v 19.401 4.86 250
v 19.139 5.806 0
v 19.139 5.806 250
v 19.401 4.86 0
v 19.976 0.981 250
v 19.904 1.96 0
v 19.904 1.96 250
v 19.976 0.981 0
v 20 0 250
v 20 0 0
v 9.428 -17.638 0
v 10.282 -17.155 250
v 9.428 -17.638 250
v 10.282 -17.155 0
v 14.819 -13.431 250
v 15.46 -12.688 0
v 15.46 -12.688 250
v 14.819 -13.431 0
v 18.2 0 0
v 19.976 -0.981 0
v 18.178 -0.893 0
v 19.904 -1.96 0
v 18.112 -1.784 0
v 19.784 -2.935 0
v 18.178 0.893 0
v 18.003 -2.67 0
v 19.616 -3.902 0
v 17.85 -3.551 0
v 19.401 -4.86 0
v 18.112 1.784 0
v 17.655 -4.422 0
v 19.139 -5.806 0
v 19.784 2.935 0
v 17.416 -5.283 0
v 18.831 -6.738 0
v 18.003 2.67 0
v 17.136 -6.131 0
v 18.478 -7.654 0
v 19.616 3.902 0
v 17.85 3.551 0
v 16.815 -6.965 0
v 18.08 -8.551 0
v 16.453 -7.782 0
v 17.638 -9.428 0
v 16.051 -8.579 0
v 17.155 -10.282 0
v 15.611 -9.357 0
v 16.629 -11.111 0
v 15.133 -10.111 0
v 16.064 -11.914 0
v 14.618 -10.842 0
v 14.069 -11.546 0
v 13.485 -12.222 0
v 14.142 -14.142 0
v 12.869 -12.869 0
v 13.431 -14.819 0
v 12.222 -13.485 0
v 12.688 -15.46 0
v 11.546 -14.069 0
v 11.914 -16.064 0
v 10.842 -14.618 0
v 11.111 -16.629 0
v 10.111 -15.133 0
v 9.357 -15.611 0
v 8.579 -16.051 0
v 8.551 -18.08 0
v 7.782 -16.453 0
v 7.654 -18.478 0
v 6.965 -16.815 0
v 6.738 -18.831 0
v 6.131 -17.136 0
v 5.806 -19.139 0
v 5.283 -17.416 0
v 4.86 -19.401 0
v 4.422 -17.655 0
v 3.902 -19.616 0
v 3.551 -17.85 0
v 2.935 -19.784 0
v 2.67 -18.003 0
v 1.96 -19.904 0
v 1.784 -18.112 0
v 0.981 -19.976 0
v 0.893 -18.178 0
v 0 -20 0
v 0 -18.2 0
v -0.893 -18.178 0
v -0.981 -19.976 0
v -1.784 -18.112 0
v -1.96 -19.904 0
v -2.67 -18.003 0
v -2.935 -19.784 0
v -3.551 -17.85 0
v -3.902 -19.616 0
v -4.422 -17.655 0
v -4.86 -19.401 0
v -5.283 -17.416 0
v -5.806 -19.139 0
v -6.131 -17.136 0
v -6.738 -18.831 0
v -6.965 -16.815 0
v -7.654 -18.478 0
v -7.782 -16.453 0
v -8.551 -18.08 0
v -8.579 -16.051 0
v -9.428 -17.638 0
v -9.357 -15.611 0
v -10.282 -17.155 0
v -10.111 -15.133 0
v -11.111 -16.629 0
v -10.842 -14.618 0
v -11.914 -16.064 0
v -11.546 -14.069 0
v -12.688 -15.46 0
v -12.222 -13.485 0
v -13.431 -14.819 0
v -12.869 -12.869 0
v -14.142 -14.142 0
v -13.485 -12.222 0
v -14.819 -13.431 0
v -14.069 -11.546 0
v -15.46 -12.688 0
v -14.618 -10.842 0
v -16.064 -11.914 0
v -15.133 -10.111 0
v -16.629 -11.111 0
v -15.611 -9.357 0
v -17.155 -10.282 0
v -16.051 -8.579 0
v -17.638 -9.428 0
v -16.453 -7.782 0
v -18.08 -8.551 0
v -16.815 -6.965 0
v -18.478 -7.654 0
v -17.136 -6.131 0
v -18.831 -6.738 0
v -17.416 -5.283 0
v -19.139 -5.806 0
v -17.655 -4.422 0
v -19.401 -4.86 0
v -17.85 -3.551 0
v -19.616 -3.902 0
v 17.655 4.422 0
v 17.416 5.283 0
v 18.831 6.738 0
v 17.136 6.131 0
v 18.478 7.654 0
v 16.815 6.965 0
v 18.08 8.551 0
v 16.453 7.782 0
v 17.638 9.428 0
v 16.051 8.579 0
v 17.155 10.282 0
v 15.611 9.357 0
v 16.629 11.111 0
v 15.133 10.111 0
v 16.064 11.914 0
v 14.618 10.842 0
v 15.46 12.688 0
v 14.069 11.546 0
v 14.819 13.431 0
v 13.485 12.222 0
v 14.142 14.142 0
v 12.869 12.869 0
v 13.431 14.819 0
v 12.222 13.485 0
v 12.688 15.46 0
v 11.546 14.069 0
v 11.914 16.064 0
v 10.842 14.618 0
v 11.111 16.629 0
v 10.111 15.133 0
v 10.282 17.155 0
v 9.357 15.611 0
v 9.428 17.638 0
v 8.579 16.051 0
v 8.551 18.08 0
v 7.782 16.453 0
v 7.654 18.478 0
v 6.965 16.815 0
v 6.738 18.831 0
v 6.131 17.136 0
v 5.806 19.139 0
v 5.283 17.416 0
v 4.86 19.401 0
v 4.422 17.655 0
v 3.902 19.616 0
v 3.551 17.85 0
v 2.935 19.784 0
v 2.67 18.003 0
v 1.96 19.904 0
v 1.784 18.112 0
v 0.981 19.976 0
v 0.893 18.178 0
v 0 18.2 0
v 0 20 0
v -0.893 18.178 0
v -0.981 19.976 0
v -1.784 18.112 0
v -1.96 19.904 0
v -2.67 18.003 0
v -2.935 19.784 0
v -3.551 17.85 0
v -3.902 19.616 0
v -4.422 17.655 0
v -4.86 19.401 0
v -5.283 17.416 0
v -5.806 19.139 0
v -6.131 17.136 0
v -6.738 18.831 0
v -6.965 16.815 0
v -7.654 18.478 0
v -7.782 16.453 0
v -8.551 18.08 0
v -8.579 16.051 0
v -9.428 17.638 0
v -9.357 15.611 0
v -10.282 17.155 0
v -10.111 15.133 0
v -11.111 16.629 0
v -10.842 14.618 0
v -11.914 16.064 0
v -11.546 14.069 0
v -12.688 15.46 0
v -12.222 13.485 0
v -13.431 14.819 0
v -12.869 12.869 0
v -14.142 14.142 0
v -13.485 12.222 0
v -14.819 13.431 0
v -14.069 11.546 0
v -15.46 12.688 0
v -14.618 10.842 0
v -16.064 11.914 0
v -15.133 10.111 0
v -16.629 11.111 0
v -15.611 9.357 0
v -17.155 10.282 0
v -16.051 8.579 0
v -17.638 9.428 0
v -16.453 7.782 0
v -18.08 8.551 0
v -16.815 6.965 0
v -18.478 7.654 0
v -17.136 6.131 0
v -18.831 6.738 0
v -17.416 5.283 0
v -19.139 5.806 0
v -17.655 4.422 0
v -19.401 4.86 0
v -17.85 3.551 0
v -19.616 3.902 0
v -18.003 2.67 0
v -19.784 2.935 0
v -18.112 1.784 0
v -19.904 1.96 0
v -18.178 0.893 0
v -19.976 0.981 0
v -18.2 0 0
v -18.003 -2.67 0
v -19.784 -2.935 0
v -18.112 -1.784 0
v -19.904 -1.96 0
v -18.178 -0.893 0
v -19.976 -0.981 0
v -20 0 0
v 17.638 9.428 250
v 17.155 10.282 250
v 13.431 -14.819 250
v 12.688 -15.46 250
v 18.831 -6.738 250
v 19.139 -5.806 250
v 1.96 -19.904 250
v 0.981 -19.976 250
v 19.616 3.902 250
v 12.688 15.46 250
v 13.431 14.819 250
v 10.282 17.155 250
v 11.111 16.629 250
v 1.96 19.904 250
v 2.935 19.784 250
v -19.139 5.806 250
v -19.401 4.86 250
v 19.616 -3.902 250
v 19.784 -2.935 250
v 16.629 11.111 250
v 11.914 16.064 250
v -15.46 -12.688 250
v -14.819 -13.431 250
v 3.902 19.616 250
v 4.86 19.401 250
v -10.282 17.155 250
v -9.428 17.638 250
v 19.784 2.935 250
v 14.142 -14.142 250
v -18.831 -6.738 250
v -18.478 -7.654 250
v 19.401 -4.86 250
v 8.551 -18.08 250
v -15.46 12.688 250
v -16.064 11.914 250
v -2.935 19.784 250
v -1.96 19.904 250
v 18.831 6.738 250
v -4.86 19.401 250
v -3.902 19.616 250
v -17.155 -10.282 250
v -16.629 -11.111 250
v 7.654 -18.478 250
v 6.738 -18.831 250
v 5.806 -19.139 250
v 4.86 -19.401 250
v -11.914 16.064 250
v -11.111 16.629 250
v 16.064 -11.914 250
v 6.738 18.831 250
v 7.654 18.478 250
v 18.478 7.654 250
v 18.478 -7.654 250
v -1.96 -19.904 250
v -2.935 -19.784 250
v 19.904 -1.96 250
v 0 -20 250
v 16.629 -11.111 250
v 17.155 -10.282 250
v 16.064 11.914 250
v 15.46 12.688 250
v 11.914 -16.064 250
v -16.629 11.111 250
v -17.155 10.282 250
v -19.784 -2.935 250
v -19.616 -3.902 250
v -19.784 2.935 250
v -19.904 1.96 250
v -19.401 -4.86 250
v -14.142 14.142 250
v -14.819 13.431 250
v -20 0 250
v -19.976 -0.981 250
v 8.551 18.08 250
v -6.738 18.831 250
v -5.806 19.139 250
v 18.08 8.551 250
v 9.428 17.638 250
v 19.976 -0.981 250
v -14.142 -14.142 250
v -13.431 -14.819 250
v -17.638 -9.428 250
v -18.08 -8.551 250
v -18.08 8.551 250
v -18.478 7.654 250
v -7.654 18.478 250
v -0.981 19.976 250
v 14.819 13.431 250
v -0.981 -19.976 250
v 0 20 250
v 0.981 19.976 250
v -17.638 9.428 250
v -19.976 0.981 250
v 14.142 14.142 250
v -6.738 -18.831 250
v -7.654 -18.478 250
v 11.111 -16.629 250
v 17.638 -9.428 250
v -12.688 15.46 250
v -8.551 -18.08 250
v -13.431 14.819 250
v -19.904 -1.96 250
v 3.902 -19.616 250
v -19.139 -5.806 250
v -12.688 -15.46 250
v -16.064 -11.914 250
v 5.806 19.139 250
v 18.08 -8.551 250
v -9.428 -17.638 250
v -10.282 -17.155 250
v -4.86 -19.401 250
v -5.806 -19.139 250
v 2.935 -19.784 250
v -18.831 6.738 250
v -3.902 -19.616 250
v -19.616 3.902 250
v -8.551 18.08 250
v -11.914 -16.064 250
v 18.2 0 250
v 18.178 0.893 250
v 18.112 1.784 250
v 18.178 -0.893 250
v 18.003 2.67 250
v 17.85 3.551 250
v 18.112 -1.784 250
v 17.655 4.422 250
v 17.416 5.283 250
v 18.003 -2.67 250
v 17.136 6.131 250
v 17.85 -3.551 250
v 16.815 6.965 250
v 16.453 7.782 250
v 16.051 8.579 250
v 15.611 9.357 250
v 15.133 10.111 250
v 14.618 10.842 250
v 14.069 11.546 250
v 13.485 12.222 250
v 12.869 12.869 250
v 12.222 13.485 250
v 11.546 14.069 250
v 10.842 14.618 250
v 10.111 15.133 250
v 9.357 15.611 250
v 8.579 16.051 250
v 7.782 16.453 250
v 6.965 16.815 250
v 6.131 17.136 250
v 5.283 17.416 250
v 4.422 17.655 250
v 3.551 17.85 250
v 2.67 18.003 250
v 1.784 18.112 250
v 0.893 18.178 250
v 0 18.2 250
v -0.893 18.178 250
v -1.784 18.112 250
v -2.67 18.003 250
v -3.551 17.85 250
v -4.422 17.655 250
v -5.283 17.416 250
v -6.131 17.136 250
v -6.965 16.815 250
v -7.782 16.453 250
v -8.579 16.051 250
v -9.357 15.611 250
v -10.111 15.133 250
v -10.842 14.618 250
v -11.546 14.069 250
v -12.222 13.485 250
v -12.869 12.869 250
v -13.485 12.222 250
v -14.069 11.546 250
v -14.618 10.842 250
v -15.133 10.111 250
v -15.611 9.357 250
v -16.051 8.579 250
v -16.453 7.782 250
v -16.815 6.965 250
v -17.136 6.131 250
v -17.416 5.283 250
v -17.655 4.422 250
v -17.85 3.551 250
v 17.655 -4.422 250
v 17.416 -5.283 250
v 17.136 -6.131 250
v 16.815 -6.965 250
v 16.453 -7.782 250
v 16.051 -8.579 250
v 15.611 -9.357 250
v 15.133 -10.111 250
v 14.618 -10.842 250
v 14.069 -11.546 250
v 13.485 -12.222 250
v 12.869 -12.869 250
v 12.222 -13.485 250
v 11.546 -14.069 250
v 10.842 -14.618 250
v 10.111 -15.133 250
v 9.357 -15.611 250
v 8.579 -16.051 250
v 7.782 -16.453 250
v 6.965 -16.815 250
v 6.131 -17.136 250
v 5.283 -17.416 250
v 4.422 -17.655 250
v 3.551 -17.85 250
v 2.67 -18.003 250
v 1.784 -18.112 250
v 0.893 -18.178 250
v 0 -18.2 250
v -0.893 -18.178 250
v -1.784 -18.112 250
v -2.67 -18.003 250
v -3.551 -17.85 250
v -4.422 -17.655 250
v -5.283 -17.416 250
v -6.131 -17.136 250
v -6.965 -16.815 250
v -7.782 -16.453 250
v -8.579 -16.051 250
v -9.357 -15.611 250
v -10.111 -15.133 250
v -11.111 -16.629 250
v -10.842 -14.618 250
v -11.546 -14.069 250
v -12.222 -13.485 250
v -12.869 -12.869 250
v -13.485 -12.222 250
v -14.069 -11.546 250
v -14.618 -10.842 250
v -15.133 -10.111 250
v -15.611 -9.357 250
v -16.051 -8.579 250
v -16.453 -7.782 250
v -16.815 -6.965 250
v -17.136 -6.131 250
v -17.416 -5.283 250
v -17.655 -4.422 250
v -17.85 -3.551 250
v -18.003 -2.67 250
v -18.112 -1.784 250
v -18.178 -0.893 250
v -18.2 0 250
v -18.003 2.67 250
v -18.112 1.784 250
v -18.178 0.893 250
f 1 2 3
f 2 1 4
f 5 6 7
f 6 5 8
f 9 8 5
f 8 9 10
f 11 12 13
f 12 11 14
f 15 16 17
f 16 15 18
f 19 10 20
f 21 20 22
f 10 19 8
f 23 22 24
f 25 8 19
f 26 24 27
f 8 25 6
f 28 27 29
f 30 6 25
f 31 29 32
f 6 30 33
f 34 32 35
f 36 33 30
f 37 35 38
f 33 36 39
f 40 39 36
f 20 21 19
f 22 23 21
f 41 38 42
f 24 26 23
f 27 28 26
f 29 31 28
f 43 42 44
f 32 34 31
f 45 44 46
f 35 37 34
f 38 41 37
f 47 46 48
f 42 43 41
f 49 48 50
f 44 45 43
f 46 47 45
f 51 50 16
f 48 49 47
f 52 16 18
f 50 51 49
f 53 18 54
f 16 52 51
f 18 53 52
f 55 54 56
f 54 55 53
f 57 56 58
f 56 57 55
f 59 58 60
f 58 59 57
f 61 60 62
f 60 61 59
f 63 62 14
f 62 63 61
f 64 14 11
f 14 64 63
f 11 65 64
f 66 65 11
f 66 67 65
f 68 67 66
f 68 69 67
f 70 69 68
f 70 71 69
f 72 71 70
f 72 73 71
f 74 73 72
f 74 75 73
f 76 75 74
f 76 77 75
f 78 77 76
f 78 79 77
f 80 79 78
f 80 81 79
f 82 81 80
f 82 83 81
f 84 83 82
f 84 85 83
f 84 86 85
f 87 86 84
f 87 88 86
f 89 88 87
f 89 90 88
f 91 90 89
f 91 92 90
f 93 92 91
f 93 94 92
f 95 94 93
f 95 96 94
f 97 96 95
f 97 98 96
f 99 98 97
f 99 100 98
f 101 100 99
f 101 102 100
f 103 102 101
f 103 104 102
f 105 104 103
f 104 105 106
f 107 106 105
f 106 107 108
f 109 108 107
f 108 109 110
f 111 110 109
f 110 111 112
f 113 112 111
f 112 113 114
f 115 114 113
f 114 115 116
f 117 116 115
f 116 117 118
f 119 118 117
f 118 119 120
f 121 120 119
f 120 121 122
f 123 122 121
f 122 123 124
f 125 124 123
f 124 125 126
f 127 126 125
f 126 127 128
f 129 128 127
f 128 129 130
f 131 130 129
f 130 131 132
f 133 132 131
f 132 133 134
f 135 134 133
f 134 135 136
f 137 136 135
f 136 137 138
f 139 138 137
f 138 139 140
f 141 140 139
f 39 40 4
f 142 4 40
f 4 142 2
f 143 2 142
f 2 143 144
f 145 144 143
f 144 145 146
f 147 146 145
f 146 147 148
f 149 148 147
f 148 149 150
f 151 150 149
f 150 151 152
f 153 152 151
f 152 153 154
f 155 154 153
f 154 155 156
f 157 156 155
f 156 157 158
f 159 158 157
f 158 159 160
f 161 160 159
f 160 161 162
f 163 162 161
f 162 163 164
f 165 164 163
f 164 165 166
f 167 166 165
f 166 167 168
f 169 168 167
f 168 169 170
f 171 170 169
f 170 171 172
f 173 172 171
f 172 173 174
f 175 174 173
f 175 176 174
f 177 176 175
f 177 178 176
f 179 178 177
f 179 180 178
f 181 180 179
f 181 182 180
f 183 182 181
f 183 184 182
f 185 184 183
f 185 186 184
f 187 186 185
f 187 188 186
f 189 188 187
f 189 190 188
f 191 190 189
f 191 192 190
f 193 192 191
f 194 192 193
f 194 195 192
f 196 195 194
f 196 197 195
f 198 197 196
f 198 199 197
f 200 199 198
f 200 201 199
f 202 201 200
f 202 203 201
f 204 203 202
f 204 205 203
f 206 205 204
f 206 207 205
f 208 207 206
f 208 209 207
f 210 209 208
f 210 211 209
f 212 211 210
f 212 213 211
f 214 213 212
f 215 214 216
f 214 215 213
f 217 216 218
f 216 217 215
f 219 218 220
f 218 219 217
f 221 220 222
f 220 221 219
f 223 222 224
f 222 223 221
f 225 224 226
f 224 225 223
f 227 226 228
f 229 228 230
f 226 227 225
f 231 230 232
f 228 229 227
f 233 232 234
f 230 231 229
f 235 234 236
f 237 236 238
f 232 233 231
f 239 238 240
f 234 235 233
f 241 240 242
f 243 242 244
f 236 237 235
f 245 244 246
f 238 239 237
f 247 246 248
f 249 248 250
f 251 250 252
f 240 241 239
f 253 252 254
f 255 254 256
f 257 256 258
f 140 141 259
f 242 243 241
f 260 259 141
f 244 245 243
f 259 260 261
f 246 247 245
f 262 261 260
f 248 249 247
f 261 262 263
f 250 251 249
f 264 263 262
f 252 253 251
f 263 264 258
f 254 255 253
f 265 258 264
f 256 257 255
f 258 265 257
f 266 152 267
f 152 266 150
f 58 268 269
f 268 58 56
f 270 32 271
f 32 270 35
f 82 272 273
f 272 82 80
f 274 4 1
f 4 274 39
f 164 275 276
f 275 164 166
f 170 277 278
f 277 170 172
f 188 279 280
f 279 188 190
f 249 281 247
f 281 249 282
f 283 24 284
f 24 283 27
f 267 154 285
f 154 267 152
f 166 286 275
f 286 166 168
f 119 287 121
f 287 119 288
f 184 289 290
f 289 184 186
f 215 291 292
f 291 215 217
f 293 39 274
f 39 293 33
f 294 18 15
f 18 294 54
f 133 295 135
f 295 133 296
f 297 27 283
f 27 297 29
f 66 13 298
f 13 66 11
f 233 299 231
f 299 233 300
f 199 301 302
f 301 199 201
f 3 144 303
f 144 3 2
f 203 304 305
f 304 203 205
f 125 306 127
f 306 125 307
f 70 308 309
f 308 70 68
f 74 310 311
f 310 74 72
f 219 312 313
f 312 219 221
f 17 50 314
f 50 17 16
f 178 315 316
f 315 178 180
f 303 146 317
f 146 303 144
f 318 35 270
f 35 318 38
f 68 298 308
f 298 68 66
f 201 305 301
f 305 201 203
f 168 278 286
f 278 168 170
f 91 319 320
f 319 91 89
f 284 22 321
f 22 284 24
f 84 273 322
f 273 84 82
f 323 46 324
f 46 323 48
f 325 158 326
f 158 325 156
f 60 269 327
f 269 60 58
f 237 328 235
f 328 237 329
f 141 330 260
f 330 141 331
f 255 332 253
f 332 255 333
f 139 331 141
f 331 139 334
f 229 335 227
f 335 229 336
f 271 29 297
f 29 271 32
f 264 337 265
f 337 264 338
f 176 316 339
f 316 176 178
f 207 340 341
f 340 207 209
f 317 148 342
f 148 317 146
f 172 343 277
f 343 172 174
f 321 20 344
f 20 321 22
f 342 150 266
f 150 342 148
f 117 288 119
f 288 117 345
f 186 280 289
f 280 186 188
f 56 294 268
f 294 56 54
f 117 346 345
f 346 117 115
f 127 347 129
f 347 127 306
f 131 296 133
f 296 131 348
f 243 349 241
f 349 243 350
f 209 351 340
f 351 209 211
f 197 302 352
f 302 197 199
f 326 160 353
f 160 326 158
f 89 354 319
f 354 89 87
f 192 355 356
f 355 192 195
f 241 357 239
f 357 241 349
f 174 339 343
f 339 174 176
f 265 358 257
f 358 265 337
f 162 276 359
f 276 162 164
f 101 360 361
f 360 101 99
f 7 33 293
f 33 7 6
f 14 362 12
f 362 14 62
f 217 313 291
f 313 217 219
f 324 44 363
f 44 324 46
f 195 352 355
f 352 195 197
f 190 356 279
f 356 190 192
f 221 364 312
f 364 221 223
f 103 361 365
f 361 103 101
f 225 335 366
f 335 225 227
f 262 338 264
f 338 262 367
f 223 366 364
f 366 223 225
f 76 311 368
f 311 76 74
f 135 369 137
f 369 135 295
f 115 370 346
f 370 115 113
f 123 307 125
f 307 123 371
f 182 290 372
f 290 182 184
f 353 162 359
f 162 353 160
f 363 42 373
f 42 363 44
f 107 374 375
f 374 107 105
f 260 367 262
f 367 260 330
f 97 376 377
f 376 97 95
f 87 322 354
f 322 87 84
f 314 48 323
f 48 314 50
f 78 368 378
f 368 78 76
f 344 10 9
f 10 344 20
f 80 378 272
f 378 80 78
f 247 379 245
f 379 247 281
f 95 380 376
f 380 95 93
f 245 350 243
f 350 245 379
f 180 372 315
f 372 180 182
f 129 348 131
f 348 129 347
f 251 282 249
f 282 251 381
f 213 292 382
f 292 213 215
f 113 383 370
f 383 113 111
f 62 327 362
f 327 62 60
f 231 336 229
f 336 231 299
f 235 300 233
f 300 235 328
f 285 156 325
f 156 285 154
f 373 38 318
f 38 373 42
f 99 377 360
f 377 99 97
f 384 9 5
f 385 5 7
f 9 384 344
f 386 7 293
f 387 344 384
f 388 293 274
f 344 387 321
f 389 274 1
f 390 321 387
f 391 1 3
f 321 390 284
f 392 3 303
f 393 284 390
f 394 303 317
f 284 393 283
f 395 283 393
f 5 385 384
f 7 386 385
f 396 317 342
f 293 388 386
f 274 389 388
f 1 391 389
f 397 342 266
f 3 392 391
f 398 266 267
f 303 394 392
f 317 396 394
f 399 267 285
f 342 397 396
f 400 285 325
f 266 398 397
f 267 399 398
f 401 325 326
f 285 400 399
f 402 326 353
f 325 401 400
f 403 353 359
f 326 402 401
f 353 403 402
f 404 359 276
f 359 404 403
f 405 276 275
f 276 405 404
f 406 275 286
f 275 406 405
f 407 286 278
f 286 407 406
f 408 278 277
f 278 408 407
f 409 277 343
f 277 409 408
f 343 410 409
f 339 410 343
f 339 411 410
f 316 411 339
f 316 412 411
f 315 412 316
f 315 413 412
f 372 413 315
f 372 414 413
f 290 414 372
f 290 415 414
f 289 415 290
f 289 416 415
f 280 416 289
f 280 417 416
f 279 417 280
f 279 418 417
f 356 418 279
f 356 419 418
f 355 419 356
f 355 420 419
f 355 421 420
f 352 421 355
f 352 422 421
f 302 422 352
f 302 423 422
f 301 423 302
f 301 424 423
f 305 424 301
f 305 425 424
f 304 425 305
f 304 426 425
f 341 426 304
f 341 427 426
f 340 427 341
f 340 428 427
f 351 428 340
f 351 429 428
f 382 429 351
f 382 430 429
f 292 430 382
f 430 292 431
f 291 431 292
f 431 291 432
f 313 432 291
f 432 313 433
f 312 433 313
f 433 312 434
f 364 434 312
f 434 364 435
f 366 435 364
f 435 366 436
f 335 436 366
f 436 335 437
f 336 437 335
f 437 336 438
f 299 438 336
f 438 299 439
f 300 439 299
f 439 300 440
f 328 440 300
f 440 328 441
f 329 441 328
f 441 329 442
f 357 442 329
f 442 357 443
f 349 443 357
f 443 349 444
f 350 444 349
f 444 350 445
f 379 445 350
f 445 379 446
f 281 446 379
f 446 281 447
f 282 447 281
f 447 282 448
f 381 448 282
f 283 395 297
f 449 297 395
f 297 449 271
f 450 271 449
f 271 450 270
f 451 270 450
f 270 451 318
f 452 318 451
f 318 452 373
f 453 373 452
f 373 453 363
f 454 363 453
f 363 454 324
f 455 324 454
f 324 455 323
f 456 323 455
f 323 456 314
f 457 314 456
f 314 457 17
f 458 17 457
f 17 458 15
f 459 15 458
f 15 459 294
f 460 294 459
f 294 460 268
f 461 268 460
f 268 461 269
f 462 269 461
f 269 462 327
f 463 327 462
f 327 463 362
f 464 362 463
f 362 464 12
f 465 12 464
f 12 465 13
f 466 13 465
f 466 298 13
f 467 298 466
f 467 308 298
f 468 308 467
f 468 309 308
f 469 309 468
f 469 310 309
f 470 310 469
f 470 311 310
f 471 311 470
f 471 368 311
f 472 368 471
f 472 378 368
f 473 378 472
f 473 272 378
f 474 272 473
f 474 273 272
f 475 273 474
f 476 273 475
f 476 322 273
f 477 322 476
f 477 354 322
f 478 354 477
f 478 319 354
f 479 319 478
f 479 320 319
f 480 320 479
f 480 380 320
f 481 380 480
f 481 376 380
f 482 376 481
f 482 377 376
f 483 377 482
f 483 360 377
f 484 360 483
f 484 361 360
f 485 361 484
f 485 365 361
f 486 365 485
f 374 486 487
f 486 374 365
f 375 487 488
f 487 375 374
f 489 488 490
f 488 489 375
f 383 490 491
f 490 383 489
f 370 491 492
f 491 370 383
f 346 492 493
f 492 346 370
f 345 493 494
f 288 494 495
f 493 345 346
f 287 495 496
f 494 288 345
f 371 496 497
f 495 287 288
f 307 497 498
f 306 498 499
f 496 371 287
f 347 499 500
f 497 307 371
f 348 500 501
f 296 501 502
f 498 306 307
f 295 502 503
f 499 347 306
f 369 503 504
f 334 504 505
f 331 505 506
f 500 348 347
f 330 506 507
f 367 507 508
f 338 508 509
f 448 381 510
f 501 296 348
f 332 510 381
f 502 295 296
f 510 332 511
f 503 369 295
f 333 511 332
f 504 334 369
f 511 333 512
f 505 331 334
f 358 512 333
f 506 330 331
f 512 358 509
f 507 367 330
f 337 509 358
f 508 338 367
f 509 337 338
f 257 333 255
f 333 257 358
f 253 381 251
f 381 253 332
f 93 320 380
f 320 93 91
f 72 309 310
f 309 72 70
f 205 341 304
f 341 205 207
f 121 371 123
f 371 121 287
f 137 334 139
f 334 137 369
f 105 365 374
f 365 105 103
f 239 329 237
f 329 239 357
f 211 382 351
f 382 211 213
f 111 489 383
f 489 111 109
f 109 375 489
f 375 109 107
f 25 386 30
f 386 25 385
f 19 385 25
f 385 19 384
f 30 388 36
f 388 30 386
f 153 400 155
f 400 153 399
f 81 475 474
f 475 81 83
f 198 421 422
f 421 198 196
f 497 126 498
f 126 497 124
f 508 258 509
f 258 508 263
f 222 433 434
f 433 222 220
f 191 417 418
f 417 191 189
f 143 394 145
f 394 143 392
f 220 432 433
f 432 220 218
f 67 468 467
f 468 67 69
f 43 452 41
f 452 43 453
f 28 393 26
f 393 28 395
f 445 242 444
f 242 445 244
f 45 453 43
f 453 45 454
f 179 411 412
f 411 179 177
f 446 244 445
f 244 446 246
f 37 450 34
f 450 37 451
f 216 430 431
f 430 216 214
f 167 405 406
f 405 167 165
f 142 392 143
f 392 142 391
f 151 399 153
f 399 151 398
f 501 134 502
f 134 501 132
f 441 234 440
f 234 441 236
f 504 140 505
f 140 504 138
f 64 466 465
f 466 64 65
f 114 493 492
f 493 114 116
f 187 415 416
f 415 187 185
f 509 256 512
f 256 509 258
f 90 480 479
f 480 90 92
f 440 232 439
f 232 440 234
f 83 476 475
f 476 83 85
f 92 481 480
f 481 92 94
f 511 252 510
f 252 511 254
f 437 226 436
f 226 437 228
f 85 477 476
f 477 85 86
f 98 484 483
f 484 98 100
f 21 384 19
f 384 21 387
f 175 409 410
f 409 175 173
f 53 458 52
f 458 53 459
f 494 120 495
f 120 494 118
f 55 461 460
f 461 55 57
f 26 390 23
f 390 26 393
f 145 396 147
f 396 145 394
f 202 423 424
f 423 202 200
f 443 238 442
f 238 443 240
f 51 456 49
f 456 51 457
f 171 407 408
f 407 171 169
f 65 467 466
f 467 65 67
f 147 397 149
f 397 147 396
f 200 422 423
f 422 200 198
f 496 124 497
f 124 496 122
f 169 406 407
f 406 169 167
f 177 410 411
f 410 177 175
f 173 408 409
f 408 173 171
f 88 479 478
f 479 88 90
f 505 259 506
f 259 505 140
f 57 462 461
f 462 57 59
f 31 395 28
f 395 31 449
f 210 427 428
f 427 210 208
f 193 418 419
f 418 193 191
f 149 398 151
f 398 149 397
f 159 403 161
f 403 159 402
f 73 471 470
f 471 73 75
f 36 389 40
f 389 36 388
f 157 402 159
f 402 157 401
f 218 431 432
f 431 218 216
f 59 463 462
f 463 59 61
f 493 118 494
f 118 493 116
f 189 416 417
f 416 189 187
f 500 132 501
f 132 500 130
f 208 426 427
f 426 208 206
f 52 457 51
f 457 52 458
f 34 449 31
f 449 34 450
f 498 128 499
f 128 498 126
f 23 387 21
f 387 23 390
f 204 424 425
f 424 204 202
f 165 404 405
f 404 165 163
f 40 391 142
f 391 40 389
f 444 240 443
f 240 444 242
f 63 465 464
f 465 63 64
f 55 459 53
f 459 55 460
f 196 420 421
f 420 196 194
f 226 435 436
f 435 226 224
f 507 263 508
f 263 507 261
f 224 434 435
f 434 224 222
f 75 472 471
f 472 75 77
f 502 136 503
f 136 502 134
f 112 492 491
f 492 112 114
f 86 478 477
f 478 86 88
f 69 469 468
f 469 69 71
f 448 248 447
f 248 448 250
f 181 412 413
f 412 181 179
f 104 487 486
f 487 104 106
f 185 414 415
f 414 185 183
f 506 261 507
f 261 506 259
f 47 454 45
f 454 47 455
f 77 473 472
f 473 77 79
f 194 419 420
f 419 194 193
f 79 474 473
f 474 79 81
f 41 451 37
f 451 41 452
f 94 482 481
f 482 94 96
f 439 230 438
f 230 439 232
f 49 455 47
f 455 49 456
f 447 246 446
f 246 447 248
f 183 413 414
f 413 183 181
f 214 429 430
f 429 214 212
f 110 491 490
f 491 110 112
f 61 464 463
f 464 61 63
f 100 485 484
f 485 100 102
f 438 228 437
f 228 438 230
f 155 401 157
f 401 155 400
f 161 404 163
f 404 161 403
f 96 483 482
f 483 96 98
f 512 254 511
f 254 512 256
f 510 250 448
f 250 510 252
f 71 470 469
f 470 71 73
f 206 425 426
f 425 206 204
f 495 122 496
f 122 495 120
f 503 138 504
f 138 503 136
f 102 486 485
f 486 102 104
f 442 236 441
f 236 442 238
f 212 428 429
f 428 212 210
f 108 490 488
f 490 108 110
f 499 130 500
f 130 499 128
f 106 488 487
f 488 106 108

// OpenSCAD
$fn = 128;

// HT 40 pipe (approx): DN40, OD 40 mm, typical wall ~1.8 mm
// Length: 250 mm
od = 40;
wall = 1.8;
id = od - 2*wall;
len = 250;

module ht_pipe(od, id, len) {
    difference() {
        cylinder(h = len, d = od);
        translate([0,0,-0.1]) cylinder(h = len + 0.2, d = id);
    }
}

ht_pipe(od, id, len);
